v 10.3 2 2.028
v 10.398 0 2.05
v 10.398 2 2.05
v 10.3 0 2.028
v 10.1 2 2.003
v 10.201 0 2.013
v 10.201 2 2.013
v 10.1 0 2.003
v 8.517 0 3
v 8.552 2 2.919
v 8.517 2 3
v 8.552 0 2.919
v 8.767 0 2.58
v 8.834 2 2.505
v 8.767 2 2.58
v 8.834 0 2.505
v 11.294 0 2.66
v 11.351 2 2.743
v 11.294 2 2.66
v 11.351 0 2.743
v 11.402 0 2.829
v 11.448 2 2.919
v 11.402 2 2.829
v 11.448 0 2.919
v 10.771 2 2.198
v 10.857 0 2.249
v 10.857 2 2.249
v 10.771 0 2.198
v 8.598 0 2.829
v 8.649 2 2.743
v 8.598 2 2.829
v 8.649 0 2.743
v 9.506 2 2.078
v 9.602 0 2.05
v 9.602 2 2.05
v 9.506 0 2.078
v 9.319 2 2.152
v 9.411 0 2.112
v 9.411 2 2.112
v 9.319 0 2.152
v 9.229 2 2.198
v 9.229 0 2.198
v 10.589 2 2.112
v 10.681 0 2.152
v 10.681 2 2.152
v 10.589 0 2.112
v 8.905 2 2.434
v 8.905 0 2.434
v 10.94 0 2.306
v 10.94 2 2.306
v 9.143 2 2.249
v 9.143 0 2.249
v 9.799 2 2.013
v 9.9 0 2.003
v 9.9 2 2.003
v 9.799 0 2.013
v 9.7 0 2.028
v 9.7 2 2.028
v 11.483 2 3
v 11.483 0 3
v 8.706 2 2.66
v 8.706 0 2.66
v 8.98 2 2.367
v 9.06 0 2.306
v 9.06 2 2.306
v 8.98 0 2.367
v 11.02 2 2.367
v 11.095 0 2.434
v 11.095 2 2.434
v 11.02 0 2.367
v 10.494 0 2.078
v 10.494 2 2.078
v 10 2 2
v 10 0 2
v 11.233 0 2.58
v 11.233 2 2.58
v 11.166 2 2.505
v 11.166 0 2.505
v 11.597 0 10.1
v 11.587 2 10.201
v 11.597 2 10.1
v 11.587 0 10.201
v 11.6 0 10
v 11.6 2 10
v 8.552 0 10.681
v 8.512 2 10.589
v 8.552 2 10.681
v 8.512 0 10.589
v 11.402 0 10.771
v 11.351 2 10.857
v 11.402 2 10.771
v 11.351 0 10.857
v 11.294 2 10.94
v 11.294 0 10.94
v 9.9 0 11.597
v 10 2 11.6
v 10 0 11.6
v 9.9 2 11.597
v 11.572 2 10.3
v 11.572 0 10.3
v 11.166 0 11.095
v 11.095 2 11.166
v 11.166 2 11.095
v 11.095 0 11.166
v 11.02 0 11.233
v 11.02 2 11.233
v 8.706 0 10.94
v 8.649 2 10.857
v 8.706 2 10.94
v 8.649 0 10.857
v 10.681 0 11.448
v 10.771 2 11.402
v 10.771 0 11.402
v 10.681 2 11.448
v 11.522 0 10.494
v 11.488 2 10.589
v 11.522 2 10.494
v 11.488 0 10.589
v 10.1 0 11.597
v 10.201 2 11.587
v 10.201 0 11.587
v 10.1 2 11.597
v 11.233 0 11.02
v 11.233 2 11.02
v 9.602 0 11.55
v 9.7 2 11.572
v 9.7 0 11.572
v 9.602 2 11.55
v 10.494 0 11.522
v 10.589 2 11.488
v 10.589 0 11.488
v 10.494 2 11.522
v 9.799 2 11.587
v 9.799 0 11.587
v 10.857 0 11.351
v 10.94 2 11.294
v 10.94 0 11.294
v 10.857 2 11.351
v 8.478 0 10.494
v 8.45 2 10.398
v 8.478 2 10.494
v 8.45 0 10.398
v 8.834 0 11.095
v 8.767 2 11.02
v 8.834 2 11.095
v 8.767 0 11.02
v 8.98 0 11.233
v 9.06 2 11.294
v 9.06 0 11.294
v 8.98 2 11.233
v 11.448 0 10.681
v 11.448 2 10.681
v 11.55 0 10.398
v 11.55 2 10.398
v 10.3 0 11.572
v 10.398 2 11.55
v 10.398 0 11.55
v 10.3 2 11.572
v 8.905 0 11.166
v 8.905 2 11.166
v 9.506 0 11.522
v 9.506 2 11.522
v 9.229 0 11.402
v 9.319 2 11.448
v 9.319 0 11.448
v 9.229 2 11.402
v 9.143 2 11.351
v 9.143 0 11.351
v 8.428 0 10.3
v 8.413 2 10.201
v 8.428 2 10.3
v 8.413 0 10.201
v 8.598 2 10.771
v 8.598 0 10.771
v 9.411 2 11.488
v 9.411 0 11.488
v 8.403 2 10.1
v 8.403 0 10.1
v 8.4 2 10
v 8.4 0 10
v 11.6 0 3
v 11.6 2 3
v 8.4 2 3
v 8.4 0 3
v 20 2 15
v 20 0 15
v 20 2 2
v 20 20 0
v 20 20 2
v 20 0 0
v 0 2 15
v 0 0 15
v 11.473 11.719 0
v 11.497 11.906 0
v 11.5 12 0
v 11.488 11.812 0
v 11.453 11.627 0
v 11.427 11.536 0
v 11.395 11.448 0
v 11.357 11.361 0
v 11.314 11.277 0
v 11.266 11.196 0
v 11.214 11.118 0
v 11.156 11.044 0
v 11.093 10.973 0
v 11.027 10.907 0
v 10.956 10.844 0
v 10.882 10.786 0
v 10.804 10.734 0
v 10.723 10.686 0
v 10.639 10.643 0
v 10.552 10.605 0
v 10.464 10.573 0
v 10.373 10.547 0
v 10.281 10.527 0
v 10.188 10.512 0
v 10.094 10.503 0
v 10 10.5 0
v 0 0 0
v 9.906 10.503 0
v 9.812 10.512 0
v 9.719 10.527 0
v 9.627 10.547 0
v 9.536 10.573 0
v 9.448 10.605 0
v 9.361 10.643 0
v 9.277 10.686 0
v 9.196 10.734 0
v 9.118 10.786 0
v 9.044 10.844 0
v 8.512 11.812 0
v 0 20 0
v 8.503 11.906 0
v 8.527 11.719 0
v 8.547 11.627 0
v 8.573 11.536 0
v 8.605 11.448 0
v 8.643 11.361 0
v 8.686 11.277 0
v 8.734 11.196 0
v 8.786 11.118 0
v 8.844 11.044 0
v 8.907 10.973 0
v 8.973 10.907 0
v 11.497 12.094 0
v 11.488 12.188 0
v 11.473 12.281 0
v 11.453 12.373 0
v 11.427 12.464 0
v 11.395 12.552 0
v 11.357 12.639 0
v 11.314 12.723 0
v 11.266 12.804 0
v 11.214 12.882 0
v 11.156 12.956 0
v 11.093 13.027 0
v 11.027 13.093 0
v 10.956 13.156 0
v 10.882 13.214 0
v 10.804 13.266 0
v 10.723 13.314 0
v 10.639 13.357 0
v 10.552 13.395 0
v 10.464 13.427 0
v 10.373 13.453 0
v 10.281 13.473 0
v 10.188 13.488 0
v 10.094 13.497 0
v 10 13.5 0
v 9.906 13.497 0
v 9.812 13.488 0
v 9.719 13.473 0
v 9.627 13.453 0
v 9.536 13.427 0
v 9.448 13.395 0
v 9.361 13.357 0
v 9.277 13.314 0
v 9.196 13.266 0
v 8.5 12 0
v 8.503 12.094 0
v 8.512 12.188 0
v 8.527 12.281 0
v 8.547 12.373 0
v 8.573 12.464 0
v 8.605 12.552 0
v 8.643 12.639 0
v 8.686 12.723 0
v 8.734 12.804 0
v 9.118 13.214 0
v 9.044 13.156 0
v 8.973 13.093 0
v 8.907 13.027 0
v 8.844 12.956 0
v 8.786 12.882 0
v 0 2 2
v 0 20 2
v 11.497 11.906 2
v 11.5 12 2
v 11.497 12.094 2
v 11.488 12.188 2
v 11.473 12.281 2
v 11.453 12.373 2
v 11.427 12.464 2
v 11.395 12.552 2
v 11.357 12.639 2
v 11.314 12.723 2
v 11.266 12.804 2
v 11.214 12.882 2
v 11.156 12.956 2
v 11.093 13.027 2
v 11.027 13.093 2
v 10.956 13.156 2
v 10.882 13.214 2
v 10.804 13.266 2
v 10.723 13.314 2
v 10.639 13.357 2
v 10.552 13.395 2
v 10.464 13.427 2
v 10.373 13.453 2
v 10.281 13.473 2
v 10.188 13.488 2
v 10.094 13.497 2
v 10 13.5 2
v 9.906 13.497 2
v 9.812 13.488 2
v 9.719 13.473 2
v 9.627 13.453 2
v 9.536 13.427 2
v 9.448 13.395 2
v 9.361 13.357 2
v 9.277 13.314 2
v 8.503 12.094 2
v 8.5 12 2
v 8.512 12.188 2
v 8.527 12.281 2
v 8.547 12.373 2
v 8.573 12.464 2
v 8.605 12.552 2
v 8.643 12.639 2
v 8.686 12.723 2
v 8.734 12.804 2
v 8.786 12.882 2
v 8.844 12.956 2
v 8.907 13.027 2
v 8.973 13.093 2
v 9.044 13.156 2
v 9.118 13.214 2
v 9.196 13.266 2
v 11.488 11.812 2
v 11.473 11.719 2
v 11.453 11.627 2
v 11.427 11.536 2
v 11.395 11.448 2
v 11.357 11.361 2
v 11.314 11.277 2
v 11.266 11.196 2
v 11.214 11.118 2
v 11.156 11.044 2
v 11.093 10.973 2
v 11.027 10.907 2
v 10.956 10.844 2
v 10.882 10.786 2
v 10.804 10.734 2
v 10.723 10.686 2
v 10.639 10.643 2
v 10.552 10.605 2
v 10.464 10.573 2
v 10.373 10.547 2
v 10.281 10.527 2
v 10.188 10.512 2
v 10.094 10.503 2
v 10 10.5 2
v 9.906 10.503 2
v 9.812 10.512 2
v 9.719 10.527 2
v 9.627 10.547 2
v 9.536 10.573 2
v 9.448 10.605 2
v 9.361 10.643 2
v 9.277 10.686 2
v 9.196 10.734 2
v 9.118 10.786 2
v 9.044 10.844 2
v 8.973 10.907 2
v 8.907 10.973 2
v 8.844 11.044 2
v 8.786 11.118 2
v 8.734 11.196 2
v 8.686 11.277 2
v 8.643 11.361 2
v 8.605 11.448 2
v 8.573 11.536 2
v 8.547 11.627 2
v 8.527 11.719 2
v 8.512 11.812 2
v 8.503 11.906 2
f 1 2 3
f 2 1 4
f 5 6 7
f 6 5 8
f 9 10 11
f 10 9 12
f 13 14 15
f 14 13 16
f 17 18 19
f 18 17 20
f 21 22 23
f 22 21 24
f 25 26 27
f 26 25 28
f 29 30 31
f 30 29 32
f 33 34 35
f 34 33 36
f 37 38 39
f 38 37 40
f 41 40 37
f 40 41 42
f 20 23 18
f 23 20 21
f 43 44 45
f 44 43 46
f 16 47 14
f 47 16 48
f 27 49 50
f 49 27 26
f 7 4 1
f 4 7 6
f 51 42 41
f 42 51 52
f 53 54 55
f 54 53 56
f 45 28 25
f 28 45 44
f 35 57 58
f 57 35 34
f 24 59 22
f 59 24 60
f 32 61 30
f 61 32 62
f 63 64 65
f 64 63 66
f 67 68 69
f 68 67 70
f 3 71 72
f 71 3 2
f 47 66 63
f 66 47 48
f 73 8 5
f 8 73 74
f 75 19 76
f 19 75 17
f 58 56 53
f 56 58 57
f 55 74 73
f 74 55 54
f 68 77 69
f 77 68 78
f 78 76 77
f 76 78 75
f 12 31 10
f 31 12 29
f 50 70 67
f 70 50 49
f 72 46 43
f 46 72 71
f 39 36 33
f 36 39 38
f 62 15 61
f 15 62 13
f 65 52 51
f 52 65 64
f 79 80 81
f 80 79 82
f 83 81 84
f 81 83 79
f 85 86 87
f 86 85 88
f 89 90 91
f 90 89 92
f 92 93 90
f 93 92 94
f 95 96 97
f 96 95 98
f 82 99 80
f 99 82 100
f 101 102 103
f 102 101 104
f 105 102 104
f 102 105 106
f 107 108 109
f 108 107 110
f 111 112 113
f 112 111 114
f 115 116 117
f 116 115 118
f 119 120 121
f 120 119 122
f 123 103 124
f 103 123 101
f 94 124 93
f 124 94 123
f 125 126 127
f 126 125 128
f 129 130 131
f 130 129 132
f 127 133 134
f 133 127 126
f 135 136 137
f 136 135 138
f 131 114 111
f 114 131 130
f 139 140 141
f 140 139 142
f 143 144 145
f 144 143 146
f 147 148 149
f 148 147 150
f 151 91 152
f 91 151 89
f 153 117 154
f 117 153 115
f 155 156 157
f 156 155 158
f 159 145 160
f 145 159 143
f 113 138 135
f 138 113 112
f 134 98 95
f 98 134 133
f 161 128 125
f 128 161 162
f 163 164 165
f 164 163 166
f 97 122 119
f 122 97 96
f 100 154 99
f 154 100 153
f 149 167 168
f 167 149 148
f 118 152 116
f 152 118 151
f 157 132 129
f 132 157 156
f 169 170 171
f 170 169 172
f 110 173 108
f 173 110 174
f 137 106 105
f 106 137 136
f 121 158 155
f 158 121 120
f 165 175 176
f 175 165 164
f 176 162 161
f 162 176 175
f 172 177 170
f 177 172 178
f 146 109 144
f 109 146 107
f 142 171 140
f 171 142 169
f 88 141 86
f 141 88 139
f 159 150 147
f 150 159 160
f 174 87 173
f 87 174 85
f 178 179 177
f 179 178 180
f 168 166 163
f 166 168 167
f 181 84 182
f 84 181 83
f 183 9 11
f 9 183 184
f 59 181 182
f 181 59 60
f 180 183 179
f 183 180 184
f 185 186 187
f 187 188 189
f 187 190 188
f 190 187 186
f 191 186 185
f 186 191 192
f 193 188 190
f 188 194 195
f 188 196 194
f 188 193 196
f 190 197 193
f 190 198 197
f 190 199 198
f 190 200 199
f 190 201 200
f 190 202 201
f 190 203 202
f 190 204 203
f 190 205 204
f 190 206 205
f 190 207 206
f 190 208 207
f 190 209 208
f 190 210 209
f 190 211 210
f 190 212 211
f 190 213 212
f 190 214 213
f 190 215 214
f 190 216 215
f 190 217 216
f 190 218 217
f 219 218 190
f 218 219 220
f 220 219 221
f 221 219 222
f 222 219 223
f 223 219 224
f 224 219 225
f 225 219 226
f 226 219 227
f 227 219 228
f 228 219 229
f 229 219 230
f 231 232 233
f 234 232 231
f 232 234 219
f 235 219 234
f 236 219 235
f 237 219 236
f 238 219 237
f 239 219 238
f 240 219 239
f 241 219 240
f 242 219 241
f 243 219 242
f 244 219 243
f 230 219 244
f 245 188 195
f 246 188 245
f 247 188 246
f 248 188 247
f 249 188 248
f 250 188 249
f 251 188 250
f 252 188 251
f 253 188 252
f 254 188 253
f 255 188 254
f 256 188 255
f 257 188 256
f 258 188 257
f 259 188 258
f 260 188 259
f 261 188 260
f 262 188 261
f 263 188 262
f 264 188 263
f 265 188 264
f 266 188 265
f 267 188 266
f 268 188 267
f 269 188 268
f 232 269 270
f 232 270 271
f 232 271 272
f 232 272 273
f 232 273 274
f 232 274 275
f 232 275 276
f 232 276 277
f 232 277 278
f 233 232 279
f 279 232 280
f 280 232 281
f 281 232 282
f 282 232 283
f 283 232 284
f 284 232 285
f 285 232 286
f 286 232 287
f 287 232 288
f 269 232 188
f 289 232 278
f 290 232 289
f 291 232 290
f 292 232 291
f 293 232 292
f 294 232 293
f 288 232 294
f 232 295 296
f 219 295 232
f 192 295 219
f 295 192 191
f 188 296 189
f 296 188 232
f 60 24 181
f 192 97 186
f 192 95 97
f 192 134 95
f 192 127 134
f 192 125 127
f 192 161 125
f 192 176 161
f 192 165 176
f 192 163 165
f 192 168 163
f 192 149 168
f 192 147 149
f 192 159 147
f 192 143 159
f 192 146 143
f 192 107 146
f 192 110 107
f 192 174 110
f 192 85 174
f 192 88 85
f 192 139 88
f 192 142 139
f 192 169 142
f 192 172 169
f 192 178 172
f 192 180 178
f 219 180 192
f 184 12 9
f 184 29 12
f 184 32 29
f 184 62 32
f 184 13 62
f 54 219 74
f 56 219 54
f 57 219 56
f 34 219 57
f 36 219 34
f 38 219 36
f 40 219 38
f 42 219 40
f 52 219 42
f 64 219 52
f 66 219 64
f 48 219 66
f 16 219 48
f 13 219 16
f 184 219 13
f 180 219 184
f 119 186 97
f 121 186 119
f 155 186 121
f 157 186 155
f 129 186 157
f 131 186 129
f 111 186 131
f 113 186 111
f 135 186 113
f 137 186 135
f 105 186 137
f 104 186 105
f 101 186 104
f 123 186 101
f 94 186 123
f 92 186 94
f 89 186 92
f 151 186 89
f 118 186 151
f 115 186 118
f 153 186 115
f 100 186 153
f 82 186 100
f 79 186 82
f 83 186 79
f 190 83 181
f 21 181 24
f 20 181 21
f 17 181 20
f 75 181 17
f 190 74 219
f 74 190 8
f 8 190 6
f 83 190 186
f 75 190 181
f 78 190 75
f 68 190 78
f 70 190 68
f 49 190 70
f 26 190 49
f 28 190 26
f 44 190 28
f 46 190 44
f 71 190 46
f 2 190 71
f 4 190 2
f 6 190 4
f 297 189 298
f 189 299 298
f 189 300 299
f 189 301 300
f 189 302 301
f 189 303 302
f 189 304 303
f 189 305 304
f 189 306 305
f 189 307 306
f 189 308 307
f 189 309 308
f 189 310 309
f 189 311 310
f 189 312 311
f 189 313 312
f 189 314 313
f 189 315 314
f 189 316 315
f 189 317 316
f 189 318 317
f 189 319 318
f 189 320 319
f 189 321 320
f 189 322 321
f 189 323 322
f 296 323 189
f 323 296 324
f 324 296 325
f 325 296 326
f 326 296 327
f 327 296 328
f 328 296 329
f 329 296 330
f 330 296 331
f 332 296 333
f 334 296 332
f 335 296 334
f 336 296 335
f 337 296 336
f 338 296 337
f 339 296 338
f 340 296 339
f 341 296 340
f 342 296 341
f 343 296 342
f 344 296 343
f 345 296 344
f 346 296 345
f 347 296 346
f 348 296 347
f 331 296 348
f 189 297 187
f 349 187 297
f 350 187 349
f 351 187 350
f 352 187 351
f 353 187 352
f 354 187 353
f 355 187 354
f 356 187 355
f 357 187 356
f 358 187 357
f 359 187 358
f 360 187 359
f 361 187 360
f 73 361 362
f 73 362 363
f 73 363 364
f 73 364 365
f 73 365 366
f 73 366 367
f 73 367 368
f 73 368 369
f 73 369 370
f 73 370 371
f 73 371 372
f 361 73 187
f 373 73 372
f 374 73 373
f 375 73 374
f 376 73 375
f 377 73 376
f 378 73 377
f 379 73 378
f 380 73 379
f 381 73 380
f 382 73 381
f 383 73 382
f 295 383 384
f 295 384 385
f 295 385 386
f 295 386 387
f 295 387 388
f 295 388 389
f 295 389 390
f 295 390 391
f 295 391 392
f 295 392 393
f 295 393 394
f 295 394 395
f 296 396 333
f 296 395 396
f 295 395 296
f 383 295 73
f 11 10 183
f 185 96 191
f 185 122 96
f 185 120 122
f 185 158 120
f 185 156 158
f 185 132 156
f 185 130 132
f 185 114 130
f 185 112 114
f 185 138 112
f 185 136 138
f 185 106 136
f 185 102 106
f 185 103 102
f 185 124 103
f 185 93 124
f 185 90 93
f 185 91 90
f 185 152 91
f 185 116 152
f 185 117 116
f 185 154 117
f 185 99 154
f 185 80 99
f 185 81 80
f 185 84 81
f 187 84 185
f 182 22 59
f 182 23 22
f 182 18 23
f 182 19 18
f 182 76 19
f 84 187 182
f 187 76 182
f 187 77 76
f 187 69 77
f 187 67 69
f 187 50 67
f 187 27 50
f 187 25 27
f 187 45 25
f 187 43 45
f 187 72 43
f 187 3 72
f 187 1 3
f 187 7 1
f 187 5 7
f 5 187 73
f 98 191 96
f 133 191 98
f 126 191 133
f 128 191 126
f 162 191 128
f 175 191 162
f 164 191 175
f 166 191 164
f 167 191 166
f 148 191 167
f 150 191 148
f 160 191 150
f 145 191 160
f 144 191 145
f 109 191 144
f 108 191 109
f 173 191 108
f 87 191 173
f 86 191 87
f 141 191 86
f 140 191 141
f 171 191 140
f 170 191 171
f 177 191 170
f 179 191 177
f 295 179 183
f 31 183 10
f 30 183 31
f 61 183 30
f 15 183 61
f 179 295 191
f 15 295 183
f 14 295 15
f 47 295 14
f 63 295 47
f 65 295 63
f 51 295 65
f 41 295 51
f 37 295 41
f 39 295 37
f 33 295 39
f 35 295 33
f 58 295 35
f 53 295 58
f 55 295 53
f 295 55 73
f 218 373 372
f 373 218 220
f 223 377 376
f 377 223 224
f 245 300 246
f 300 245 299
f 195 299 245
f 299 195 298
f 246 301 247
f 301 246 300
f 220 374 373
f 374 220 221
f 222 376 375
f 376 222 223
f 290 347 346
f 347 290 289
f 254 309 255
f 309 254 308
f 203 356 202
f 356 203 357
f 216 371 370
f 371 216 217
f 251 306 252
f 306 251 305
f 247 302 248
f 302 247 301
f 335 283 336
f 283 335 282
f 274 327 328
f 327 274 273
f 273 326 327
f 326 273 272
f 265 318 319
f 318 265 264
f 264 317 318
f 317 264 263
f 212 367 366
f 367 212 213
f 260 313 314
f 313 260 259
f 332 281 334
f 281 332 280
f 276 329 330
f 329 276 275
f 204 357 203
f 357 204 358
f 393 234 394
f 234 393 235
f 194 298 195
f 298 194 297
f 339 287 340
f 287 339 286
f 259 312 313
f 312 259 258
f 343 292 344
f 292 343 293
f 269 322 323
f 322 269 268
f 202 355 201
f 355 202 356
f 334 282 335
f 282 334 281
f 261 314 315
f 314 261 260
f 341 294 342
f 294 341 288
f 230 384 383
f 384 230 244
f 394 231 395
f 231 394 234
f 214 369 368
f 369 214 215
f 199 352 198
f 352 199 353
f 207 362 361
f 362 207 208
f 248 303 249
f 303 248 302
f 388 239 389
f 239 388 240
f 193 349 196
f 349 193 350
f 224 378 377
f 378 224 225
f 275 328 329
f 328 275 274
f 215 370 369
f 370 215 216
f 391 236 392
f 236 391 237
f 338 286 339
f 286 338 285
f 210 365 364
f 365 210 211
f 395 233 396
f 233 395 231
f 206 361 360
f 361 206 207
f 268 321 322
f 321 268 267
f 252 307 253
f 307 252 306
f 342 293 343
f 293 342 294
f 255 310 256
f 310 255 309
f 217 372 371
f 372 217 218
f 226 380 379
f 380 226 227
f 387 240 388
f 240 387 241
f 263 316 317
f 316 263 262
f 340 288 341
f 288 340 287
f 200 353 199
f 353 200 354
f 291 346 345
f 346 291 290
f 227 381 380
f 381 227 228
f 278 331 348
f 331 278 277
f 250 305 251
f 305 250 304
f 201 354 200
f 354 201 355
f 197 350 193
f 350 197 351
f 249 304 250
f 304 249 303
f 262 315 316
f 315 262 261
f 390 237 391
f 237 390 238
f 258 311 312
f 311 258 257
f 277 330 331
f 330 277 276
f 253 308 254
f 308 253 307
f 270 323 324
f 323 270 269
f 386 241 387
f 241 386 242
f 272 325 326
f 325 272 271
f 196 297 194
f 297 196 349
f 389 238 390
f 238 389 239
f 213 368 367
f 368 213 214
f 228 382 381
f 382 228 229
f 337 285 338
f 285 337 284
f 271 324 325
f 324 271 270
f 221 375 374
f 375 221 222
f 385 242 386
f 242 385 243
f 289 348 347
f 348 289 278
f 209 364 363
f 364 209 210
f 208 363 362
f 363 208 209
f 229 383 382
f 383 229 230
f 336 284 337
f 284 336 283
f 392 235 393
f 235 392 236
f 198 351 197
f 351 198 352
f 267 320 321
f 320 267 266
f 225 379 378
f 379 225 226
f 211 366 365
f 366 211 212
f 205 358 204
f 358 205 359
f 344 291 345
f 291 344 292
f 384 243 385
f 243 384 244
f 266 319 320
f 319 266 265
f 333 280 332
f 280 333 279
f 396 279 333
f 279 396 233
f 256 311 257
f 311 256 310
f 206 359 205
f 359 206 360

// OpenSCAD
difference() {
    cube([20, 20, 15]);
    translate([-2, 2, 2])
        cube([24, 20, 20]);

    union() {
        translate([10, 3, 3.6])
            rotate([90, 0, 0])
                cylinder(r=1.6,  h=5, $fn=100);
        
        translate([10, 3, 10])
            rotate([90, 0, 0])
                cylinder(r=1.6,  h=5, $fn=100);
        
        translate([10-1.6, -2, 3])
            cube([1.6*2, 5, 7]);
    }
    
    translate([10, 12, -2])
        cylinder(r=1.5, h=5, $fn=100);
}
